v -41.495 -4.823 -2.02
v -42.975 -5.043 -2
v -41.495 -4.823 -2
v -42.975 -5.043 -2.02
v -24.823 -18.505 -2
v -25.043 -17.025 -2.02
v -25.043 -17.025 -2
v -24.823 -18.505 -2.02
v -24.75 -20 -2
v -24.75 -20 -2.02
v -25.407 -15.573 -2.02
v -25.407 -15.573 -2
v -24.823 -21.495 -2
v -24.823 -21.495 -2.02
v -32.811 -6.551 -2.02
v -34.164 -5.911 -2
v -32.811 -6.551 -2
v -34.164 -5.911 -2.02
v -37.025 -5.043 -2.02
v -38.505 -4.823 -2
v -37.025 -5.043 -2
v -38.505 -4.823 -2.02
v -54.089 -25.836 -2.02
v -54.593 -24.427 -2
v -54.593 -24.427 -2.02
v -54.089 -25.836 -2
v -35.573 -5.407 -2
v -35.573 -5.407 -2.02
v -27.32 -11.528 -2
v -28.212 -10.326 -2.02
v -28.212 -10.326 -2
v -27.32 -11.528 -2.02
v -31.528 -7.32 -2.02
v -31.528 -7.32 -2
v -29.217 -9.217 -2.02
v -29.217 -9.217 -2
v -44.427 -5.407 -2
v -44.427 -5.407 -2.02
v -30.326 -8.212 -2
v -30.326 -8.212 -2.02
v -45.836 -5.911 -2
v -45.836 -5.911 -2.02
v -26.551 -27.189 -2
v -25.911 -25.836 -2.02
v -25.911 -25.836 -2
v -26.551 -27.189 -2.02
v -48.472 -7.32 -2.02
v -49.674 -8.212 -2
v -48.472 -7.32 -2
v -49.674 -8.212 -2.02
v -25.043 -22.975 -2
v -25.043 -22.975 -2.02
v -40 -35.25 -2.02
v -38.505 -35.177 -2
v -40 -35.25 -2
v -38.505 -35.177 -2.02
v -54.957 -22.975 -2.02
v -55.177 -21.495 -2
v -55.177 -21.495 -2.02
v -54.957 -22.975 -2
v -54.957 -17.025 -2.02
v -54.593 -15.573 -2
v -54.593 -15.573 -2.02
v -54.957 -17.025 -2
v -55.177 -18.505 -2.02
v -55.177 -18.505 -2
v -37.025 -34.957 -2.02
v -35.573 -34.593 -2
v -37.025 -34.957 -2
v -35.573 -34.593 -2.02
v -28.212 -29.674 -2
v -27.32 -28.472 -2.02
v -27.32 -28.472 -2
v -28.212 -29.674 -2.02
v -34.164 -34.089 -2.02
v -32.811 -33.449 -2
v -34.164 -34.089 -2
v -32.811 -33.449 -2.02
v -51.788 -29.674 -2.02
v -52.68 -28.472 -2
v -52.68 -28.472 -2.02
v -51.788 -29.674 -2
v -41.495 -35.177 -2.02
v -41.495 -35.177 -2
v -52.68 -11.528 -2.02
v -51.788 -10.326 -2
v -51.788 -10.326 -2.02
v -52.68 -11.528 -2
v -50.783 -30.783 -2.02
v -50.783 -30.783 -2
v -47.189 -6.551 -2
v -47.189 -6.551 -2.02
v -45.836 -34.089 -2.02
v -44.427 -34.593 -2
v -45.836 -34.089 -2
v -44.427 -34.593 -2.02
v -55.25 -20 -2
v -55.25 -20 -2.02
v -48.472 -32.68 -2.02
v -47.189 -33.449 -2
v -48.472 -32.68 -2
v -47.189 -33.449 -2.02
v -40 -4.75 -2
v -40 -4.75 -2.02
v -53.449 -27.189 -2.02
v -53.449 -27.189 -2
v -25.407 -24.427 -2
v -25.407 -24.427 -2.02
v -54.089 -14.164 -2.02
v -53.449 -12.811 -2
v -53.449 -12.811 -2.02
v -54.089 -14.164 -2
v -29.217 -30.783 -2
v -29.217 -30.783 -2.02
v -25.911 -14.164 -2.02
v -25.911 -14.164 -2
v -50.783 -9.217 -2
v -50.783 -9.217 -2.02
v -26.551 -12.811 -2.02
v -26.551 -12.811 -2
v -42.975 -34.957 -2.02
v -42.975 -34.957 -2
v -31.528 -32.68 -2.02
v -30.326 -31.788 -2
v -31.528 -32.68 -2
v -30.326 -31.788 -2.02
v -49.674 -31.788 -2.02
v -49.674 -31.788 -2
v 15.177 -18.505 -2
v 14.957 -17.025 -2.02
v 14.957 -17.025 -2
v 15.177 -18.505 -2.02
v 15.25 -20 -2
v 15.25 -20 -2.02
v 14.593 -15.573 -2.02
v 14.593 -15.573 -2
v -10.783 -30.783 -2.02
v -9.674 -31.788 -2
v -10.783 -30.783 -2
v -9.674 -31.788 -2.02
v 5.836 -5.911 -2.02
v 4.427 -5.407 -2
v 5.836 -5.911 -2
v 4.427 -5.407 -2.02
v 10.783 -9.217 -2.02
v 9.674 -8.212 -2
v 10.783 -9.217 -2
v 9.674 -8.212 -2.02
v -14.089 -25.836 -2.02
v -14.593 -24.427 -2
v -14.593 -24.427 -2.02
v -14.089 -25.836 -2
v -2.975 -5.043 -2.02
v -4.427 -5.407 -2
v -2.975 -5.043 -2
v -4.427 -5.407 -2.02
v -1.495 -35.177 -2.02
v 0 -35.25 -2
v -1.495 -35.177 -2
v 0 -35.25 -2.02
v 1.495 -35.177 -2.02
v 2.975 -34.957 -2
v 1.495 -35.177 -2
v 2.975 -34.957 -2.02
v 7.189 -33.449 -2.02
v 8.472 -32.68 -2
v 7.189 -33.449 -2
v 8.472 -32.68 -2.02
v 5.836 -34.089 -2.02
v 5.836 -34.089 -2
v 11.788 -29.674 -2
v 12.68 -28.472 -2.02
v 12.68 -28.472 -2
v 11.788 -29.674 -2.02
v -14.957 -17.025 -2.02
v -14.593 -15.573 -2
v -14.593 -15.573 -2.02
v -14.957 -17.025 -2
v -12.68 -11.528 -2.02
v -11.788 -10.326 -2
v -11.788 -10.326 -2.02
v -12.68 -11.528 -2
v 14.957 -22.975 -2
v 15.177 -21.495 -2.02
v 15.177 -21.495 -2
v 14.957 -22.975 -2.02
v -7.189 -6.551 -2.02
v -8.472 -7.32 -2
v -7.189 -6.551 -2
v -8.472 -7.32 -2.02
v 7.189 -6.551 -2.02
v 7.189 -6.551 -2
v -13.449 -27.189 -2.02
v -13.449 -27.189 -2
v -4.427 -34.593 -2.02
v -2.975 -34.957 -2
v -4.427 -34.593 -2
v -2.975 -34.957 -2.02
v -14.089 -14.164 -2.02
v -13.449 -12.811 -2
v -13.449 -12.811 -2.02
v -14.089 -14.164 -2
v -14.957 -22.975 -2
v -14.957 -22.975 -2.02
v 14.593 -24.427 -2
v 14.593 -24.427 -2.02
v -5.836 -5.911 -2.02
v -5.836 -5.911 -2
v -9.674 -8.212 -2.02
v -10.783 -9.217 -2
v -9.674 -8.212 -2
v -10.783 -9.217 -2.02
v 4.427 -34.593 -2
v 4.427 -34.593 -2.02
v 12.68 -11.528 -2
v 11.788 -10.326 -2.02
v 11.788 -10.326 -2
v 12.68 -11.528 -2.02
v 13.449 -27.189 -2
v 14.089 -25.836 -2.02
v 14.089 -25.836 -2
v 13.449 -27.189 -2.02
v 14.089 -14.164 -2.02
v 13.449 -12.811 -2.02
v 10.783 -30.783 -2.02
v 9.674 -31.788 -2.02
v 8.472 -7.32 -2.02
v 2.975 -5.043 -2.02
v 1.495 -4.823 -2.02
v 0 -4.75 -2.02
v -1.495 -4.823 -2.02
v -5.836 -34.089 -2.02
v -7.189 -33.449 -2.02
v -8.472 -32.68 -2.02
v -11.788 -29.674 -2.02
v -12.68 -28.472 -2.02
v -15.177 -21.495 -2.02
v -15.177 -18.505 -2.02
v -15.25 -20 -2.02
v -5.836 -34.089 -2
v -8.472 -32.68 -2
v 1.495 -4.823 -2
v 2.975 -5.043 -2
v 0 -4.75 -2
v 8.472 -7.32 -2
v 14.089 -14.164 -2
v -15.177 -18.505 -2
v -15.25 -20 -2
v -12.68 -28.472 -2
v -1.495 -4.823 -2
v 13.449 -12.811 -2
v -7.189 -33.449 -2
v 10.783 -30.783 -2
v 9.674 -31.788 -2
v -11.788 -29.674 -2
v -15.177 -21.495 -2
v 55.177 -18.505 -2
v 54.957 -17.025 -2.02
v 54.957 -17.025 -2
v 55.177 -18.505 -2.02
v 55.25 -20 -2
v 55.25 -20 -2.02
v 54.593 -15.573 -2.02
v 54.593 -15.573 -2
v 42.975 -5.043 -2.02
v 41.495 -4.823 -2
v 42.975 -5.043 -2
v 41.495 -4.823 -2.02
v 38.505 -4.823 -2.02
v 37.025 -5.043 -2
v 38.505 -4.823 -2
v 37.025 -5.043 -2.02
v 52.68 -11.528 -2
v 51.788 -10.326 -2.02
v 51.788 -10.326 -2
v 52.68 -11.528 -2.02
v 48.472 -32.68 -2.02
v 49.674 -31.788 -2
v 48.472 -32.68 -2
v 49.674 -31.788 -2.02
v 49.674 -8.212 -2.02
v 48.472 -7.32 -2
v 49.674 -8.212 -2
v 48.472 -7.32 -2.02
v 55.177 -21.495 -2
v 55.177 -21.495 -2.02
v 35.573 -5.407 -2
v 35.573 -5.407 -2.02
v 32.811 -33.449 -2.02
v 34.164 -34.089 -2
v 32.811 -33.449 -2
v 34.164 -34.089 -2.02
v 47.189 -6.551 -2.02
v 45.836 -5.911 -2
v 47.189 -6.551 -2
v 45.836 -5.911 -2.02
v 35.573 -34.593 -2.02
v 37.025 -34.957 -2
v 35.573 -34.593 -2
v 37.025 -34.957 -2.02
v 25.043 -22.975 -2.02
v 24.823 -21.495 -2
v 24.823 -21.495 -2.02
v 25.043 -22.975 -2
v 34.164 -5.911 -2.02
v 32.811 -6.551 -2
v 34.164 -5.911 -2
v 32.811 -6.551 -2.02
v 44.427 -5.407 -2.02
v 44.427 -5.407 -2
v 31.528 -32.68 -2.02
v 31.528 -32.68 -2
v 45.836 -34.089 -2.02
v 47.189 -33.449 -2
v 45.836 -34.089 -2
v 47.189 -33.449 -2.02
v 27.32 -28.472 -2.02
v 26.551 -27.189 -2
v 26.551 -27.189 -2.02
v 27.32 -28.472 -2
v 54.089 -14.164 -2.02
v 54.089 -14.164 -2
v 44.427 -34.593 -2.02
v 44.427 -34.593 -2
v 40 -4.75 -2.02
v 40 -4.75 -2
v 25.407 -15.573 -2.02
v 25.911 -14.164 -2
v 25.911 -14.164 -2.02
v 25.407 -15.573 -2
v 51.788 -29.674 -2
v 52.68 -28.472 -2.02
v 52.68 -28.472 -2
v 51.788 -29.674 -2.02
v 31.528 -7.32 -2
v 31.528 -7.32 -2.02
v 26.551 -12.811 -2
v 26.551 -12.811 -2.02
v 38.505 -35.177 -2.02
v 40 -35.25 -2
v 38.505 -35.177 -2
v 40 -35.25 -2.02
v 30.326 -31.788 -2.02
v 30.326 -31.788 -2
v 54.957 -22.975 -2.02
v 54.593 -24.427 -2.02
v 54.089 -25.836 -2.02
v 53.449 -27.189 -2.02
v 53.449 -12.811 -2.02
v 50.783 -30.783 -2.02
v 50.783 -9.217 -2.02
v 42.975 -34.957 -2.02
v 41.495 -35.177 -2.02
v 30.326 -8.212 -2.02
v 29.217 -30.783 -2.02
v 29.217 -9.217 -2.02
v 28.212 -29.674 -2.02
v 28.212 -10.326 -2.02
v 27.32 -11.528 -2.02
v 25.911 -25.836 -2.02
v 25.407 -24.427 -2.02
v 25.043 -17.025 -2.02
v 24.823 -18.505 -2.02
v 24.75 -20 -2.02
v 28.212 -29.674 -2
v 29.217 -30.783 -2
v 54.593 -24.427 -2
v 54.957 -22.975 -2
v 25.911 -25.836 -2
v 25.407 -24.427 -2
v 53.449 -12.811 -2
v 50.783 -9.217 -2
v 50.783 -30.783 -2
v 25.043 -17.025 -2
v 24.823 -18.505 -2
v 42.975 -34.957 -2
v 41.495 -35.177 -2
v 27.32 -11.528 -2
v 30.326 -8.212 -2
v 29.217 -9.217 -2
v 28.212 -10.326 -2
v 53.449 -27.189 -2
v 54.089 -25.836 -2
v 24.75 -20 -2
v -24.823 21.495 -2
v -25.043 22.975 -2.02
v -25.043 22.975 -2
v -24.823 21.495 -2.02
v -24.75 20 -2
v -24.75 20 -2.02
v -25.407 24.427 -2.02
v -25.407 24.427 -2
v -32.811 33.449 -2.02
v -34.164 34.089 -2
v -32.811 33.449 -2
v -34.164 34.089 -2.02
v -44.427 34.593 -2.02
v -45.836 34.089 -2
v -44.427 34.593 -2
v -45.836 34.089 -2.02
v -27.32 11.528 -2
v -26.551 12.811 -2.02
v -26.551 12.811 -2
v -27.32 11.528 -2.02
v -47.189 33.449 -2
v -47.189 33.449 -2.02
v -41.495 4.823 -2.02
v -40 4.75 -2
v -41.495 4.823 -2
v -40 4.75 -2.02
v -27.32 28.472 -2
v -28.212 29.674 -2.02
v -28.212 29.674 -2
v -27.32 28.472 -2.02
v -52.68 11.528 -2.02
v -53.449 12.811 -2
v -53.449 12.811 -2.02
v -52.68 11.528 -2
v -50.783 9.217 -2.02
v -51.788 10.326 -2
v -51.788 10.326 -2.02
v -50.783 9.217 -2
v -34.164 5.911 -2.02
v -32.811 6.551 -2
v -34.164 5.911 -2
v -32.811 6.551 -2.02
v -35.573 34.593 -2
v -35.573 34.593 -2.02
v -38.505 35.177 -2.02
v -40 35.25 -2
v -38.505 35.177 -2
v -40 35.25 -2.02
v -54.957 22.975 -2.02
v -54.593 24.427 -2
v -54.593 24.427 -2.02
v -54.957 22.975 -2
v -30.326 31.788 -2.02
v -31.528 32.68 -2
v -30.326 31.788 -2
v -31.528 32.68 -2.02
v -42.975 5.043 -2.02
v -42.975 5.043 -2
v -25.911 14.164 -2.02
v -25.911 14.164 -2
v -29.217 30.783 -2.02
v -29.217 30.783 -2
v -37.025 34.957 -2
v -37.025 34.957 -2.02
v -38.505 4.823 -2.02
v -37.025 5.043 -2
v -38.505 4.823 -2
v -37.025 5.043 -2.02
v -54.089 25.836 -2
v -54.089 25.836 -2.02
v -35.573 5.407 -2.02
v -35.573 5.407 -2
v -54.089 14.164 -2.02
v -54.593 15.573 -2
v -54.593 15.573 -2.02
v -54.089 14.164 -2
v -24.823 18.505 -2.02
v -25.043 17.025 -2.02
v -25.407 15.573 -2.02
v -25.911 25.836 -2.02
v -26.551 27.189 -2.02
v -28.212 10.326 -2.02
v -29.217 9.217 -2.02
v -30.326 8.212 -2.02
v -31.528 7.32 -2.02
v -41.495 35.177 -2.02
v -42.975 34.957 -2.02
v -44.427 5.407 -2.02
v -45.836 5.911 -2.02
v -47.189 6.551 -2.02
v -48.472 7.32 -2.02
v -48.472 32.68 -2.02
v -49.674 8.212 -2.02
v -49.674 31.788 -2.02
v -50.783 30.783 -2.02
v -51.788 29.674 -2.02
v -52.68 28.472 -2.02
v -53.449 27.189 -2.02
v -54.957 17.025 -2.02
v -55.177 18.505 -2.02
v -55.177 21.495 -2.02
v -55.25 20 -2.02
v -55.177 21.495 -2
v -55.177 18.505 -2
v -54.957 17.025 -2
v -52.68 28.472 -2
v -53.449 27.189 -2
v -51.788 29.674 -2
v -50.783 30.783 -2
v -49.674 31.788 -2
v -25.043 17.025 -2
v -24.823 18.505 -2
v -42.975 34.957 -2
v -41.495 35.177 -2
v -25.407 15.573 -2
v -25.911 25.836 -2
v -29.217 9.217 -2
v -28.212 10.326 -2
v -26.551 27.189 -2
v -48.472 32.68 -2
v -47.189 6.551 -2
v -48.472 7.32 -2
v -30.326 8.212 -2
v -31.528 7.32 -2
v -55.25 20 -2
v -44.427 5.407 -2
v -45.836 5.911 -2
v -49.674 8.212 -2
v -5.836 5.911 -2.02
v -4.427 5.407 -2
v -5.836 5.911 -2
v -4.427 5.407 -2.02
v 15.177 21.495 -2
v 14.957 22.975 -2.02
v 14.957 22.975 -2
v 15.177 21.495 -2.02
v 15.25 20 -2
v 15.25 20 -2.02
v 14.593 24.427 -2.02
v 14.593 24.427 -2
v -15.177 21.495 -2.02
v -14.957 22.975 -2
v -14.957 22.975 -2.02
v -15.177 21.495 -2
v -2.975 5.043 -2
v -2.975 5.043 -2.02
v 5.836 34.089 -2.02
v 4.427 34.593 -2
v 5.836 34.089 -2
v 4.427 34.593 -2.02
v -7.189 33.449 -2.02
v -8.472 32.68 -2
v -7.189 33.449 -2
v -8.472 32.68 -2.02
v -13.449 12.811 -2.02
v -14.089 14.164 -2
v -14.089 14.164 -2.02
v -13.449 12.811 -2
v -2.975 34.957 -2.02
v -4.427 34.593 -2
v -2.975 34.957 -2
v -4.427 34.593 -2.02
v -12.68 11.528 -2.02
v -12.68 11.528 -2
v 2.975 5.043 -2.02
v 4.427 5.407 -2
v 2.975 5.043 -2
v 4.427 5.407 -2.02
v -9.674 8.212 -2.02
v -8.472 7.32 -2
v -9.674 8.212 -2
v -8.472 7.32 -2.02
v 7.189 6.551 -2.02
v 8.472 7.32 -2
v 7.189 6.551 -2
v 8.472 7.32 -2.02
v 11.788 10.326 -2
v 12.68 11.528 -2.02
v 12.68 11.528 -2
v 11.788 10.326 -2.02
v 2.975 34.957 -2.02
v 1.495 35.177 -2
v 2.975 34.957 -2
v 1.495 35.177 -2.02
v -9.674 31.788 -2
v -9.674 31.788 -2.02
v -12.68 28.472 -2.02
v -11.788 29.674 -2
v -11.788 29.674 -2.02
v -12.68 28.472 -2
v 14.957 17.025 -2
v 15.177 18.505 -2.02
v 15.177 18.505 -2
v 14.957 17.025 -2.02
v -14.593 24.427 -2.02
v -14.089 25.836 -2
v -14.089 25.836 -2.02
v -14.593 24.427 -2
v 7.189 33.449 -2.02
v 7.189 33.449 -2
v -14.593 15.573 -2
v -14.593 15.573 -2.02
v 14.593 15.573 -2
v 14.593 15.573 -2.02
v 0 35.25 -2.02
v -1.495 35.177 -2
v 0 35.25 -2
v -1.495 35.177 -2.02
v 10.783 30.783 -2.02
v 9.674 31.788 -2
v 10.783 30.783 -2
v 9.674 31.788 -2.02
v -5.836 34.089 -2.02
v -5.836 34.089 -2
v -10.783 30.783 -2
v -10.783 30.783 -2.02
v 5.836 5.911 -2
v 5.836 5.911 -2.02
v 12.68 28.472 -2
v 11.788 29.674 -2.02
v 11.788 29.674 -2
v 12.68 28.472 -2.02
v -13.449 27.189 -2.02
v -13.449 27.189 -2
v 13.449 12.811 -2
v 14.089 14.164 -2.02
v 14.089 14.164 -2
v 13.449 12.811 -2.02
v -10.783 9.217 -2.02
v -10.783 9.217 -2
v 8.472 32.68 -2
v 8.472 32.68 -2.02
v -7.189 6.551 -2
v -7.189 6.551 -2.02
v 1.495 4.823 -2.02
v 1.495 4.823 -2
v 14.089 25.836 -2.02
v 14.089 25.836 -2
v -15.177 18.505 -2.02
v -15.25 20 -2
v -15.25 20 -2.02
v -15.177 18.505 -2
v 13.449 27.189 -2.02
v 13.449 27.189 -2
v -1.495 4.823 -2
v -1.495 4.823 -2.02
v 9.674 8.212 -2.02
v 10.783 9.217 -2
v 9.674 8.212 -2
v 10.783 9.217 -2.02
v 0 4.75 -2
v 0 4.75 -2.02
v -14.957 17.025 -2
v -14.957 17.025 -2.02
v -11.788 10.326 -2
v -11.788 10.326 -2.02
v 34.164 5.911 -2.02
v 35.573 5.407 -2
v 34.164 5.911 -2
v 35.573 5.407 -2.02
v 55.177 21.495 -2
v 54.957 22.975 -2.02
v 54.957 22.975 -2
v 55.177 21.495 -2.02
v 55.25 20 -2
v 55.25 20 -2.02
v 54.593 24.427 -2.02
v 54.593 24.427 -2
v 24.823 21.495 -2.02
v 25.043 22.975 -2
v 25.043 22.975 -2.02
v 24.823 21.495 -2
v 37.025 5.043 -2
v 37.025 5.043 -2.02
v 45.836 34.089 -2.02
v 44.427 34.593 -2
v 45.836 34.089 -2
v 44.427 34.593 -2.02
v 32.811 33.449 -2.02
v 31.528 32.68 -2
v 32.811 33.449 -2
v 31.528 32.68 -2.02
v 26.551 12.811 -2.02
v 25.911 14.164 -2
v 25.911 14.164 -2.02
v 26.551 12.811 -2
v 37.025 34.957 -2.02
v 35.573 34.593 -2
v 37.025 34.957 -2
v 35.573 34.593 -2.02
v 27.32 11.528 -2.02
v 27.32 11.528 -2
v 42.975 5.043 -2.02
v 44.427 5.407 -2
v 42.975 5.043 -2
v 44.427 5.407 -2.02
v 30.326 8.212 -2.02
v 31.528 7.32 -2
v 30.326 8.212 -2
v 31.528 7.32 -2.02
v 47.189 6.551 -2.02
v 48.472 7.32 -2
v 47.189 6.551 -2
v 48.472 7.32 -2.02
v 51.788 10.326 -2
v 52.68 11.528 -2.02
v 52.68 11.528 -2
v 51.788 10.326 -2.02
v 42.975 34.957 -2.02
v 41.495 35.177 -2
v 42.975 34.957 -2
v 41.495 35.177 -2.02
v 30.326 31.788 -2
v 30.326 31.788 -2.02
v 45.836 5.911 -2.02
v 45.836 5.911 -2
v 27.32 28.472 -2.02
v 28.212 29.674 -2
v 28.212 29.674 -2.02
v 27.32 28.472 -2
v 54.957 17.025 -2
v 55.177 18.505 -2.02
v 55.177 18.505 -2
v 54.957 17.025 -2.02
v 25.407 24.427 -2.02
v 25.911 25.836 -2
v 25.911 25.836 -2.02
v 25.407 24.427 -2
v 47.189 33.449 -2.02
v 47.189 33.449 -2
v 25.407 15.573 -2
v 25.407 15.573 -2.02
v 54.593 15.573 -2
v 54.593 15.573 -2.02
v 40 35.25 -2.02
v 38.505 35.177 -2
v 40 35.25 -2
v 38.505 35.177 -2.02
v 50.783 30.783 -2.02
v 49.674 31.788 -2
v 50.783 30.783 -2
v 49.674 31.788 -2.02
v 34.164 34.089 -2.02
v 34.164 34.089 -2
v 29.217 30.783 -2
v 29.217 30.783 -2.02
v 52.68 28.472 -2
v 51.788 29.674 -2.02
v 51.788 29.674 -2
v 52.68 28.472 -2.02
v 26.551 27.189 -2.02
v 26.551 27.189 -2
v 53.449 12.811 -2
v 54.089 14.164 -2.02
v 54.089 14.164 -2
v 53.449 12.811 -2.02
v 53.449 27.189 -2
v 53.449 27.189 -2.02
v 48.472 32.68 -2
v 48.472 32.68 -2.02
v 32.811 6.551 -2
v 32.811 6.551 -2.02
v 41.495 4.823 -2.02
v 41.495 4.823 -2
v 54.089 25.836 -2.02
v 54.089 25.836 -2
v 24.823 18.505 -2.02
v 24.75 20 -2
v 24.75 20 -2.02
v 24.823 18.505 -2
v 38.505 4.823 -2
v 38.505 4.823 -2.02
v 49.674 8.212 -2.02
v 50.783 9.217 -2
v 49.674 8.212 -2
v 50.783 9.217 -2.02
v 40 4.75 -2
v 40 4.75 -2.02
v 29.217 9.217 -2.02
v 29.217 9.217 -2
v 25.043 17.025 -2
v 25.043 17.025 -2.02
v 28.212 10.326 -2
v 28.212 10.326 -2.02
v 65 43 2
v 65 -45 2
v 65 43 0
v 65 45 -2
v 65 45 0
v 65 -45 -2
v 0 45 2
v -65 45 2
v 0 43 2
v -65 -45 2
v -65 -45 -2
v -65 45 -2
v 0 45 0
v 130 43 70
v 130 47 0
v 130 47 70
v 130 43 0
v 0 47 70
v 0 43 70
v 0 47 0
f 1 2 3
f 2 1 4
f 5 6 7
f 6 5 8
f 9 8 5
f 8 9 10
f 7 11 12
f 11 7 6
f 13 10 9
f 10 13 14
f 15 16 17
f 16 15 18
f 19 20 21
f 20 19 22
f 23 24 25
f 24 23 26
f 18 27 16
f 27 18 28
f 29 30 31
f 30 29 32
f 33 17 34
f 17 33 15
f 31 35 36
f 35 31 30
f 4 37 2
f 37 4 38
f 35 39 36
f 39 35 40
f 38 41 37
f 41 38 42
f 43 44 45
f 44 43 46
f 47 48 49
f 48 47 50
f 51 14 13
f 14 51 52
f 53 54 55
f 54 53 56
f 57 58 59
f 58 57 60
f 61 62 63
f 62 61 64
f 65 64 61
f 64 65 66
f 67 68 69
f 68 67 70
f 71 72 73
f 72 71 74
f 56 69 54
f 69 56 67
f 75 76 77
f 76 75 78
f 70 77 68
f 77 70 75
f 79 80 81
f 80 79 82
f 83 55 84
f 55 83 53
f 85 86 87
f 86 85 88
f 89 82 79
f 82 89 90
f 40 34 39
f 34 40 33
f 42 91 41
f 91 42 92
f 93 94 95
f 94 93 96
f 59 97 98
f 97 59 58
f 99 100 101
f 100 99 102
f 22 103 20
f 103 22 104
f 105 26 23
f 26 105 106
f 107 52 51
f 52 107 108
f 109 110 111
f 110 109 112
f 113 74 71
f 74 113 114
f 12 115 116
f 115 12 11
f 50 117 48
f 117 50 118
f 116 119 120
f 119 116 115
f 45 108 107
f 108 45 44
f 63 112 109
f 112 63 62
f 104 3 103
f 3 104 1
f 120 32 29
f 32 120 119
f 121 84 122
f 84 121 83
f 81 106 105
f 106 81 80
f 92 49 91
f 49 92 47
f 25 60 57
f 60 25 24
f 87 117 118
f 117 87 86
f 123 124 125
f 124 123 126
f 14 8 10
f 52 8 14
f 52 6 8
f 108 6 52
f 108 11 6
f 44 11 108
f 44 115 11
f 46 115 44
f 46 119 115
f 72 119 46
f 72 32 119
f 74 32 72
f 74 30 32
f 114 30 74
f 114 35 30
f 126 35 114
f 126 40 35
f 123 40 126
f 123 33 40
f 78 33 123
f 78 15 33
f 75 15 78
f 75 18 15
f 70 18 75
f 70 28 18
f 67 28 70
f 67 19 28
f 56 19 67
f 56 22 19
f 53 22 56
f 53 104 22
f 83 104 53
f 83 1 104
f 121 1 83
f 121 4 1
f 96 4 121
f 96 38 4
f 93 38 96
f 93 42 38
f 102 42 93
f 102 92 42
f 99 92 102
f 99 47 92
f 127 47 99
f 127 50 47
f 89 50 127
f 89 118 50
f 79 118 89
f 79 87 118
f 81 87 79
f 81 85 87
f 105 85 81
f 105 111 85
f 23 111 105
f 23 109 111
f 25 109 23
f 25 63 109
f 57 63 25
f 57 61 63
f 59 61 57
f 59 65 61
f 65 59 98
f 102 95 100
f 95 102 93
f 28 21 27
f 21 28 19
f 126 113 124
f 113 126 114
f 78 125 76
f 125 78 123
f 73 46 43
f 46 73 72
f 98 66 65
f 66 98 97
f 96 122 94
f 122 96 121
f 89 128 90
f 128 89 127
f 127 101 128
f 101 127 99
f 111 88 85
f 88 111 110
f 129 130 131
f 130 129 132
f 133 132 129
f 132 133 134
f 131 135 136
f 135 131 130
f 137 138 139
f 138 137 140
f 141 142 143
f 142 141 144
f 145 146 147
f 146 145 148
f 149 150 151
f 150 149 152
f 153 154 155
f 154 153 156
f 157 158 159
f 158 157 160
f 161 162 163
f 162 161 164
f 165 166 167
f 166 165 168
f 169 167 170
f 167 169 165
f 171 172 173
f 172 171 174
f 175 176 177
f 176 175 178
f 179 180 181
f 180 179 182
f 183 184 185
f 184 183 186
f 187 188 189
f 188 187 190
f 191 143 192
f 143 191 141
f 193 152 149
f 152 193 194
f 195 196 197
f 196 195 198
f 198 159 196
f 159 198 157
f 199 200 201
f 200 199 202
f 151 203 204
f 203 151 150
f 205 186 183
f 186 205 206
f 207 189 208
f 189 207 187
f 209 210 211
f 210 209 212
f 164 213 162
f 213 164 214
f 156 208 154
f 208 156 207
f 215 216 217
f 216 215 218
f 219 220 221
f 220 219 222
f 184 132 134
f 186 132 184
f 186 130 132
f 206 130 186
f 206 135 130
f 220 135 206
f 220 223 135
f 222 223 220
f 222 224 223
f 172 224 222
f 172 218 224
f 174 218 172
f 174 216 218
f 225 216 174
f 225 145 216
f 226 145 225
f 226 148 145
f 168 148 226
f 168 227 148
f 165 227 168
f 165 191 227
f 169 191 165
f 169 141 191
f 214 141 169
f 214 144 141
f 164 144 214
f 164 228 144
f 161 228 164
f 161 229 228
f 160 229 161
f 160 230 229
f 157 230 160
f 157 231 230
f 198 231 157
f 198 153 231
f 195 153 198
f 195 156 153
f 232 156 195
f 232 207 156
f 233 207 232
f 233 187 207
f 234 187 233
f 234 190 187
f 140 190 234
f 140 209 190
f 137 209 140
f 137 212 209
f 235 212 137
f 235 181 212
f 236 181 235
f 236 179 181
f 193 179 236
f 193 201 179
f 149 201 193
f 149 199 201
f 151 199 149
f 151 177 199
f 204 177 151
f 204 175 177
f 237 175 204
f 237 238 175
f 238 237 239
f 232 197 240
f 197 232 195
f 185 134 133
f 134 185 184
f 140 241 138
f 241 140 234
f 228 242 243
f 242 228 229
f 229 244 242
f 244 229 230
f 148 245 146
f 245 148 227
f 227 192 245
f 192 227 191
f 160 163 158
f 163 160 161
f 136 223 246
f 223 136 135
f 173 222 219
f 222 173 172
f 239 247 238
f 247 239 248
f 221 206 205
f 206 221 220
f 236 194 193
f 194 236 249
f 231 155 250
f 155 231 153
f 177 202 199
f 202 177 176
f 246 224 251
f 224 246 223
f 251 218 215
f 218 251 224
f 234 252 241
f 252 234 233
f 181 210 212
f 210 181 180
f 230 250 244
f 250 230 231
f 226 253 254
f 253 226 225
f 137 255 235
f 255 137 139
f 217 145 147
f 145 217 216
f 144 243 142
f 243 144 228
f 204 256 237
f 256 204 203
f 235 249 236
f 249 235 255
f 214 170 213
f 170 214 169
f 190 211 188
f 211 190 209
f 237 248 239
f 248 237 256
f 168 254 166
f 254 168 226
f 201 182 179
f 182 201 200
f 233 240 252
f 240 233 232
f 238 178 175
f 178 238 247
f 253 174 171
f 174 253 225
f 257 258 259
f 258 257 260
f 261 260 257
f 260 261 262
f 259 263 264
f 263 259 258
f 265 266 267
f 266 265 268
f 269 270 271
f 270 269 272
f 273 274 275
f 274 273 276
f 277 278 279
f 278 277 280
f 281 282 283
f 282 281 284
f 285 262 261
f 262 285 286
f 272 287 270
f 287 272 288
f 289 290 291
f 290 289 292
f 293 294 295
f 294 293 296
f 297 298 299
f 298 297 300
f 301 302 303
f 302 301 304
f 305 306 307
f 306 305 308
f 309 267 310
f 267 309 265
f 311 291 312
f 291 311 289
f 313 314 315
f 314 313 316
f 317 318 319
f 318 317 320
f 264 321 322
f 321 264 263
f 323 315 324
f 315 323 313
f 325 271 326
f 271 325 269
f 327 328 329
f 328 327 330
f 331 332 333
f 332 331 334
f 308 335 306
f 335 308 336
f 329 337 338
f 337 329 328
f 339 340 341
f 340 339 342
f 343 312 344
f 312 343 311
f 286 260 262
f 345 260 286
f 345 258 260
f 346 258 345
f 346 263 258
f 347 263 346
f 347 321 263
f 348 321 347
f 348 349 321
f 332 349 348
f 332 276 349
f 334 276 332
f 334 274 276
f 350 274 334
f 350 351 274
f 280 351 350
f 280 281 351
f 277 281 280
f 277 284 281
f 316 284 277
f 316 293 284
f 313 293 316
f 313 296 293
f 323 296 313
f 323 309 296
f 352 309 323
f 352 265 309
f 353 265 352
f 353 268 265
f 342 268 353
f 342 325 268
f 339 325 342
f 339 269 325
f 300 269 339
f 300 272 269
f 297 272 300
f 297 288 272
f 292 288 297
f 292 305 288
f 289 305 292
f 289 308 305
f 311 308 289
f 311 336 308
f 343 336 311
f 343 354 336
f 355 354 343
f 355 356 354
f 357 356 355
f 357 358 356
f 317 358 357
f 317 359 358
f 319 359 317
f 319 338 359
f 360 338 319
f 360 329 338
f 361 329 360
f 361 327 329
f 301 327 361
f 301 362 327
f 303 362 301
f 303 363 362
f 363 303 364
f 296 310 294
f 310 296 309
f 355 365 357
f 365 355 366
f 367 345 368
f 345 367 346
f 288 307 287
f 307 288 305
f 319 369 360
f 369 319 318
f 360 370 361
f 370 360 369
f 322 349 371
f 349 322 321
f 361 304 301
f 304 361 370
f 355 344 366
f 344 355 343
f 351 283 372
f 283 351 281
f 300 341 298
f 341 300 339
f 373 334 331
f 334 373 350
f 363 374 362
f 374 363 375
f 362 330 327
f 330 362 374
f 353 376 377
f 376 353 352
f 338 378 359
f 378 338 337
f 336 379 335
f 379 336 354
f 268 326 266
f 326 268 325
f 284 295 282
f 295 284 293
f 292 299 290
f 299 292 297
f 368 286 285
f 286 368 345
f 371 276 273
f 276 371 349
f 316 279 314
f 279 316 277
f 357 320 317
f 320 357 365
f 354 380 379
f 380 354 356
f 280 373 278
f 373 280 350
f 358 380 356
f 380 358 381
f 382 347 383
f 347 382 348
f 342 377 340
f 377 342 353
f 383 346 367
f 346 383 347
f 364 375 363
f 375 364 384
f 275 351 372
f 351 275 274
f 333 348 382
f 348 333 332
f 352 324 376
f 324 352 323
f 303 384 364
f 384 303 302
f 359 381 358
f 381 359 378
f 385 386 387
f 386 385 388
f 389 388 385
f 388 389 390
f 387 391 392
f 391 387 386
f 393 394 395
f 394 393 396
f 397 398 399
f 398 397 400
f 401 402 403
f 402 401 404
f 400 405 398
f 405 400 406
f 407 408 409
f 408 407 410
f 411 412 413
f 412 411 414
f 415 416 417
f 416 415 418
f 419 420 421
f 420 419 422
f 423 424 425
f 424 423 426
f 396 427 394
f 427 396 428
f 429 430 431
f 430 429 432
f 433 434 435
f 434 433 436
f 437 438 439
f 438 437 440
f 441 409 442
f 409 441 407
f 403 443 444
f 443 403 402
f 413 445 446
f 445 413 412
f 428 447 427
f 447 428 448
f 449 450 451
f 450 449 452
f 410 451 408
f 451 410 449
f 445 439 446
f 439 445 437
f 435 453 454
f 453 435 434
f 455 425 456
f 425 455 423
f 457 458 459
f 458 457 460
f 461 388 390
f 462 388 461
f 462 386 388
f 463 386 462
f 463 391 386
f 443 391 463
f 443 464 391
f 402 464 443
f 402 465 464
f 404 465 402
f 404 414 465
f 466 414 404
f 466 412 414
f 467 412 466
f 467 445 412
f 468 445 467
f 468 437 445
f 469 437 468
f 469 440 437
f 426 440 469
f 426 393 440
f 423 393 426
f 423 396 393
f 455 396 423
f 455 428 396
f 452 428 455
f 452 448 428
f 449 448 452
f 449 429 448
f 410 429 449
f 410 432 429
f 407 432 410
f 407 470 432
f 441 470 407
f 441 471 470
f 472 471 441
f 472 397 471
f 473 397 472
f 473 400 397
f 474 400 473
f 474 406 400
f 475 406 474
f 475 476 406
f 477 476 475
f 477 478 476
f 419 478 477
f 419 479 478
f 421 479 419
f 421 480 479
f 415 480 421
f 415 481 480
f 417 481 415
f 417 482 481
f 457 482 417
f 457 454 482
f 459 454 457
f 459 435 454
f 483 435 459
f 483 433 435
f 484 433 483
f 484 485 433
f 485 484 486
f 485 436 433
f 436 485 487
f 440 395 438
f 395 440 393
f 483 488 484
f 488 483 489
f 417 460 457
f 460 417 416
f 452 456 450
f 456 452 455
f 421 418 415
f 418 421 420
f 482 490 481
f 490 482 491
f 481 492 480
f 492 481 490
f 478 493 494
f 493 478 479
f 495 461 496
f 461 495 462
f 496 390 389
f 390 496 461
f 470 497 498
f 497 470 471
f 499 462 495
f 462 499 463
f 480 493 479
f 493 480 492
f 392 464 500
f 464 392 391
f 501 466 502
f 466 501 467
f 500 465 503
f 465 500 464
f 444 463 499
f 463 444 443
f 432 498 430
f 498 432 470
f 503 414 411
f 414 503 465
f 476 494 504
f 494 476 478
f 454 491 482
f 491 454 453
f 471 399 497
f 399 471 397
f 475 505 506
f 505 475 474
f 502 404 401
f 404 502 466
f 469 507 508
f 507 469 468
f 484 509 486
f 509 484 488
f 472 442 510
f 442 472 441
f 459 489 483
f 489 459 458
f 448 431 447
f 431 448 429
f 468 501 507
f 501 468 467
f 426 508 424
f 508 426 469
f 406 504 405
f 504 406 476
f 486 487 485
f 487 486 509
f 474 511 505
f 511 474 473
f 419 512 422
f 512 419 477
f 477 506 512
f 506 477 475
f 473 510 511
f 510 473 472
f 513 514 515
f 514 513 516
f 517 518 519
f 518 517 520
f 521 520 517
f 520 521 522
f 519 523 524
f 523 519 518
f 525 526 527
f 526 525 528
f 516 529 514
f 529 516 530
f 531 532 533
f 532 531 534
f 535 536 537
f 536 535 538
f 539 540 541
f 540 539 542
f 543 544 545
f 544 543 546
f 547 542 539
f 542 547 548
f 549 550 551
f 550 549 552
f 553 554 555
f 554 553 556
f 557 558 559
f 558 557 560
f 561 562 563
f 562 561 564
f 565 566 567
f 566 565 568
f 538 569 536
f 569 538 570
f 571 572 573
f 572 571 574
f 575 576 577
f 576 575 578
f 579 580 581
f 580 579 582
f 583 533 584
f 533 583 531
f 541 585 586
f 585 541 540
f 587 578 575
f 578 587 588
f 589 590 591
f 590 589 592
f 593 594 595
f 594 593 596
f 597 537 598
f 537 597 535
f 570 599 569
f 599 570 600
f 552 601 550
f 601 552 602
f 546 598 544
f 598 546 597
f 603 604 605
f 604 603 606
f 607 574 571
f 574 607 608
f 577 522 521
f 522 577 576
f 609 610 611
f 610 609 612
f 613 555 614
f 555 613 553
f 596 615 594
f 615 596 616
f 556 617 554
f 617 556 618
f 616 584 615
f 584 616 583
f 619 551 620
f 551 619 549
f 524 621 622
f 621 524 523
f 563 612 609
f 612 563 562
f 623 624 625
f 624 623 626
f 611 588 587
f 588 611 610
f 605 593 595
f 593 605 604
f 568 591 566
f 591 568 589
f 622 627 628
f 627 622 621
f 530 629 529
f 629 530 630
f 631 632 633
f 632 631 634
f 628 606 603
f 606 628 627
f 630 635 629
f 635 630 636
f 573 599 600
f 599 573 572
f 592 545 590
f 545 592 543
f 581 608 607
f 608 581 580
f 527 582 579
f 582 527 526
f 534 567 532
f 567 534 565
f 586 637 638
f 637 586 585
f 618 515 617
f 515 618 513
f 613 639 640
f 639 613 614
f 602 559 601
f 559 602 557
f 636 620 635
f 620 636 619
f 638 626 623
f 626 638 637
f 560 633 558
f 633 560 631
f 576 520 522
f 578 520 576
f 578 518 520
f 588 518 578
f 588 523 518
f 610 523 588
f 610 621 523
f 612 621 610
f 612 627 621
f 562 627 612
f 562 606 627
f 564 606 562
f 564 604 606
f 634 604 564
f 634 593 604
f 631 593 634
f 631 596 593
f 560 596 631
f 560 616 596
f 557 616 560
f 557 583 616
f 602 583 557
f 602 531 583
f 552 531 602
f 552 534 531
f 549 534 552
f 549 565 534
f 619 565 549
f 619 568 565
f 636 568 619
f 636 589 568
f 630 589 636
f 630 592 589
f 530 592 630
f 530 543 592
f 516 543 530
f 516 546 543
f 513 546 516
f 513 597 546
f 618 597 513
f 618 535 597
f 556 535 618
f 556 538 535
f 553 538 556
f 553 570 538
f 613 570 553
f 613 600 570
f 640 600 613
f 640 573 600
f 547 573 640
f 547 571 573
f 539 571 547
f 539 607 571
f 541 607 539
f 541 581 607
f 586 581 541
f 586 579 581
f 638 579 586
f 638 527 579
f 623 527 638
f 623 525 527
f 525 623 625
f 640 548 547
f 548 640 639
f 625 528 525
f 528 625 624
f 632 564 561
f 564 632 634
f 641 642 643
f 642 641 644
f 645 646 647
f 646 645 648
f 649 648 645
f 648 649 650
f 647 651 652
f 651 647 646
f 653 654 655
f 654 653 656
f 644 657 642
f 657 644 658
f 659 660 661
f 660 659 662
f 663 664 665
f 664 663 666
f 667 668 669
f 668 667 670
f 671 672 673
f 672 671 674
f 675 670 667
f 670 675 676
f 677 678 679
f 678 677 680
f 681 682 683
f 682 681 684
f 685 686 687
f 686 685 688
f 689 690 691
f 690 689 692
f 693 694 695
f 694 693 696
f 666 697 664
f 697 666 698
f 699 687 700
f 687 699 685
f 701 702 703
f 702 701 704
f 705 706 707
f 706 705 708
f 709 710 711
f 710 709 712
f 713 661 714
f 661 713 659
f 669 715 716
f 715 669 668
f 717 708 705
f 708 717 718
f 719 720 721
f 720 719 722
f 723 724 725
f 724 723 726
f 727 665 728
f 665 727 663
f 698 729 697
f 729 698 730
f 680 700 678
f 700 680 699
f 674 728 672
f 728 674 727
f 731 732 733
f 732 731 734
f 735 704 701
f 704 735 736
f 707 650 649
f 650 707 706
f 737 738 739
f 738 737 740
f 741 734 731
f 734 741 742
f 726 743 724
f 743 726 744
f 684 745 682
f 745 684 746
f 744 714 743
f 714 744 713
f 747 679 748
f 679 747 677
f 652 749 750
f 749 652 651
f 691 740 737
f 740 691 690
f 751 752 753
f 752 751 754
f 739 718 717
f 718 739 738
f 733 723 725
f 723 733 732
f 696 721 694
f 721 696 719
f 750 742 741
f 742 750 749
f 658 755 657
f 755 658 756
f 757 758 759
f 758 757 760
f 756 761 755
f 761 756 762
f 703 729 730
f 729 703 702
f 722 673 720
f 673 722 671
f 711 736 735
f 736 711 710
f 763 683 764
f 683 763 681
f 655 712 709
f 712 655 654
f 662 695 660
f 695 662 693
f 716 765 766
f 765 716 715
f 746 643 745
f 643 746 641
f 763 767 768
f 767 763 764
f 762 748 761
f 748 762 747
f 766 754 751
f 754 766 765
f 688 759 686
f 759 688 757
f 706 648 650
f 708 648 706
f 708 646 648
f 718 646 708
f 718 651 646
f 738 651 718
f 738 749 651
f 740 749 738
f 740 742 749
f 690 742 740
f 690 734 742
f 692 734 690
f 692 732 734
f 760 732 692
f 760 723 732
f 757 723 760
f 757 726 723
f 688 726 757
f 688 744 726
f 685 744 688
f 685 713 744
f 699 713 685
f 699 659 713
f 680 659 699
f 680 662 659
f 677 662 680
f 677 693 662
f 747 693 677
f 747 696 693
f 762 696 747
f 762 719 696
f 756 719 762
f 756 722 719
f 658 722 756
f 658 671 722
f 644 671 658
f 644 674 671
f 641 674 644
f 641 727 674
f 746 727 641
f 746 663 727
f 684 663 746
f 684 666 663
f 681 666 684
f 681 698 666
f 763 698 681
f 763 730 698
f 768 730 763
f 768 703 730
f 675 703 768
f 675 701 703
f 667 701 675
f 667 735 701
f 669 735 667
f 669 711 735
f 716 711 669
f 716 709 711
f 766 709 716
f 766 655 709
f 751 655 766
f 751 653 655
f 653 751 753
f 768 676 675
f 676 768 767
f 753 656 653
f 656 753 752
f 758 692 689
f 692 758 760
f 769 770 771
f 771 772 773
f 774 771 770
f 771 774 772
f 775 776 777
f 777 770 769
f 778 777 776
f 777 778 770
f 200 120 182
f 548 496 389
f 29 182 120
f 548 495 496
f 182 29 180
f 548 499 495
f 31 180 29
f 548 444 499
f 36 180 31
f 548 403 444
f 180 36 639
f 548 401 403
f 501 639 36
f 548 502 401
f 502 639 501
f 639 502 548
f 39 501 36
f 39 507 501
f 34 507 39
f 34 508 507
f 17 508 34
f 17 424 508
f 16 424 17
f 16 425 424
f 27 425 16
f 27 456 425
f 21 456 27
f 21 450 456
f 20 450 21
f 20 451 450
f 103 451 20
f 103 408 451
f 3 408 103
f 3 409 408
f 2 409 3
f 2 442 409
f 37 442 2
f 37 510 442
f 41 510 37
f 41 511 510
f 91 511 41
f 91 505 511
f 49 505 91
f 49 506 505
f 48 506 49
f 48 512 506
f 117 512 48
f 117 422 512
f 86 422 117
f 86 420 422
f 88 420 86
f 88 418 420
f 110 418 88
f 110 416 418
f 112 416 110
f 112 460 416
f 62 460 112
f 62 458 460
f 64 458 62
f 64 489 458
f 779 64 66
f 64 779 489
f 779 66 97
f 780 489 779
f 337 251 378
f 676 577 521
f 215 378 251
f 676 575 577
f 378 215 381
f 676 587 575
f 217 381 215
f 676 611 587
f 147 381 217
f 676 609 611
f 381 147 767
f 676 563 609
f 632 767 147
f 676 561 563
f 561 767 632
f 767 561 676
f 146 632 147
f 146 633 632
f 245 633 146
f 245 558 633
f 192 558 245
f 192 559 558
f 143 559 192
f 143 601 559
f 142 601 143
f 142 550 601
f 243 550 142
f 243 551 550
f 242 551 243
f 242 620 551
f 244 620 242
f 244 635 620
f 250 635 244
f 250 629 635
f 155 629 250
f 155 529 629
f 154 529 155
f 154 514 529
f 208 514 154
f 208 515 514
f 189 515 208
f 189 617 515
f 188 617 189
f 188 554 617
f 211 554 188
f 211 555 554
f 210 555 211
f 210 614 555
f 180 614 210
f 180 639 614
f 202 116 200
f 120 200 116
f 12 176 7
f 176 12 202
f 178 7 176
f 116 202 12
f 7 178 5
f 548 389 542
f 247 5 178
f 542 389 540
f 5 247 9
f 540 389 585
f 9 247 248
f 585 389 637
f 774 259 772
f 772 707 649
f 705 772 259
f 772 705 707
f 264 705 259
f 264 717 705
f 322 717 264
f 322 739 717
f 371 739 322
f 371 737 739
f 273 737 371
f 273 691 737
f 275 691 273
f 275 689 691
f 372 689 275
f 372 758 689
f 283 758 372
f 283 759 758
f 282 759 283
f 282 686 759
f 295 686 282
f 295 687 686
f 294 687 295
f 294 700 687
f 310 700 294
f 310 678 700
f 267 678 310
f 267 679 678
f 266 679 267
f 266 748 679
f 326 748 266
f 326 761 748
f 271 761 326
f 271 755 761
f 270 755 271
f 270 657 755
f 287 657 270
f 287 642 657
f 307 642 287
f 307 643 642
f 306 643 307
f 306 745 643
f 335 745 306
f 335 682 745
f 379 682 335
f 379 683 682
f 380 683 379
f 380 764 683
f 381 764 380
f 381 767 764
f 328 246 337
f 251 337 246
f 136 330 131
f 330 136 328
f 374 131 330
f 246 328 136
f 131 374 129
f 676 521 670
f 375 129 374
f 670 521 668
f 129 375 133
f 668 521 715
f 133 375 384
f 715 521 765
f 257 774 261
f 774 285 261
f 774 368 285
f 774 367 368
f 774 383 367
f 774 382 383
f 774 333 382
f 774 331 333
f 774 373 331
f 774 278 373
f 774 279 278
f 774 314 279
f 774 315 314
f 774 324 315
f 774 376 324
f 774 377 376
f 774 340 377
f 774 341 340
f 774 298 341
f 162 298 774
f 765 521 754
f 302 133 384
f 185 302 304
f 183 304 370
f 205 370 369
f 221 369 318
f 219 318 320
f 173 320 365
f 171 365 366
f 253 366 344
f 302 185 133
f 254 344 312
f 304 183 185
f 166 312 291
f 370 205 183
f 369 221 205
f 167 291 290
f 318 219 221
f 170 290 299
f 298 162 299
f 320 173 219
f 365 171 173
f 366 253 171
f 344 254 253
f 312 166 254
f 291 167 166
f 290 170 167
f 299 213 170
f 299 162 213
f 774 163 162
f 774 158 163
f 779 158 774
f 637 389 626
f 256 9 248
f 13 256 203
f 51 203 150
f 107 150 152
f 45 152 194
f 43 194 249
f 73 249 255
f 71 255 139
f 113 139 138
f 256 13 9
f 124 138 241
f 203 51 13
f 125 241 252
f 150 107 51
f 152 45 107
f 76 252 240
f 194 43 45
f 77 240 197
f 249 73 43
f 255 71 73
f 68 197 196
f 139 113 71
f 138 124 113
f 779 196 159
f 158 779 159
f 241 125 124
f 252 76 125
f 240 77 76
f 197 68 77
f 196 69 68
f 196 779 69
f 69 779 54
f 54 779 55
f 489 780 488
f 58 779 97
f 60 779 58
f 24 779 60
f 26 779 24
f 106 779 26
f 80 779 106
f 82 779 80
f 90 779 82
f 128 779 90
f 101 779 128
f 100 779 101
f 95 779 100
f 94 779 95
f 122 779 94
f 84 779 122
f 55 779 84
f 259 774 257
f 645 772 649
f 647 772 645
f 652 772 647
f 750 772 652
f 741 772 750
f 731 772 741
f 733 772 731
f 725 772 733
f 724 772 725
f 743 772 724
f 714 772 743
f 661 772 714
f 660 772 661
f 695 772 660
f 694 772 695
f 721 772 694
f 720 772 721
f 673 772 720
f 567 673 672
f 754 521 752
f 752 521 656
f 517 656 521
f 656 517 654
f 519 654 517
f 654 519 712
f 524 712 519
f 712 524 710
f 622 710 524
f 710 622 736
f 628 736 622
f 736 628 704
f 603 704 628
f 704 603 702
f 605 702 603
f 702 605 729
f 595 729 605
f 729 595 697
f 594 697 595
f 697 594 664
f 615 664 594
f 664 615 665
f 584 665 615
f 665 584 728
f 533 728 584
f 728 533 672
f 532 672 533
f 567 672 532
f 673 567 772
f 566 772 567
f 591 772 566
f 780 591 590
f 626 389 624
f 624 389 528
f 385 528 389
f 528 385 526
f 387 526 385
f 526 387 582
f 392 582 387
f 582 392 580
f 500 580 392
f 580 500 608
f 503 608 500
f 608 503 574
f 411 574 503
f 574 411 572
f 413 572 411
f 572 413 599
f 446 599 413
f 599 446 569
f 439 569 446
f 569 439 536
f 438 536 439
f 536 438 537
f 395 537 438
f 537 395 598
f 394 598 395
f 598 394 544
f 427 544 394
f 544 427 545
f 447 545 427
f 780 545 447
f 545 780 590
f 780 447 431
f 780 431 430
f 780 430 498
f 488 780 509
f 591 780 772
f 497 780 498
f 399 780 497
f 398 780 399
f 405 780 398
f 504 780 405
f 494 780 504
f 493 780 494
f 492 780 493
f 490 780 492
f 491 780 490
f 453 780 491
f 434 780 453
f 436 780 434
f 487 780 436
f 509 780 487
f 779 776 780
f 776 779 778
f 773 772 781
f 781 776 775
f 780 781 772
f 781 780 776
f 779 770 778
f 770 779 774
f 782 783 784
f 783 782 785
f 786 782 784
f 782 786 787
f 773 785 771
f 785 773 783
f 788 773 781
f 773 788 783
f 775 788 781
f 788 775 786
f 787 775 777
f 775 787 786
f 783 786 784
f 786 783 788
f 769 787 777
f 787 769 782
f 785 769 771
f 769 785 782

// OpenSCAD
// Dimensions for the rack for six 50 mL conical (Falcon-type) tubes
// Print orientation: flat plate on bed (z = 0 to 4), walls rise from edges
// After flipping, rack stands on walls, tubes through holes

// Plate dimensions
plate_length_X = 130;   // mm
plate_width_Y = 90;     // mm
plate_thickness_Z = 4;   // mm

// Hole parameters
hole_diameter = 30.5;   // mm
hole_spacing_X = 40;        // mm (center-to-center along X)
hole_spacing_Y = 40;     // mm (center-to-center along Y)
num_holes_X = 3;       // 3 holes along X (2 rows of 3)
num_holes_Y = 2;       // 2 rows along Y

// Wall parameters
wall_length_X = plate_length_X;     // 130 mm
wall_thickness_Y = 4;                   // mm (along Y)
wall_height_Z = 70;                 // mm (from plate to top)

// Center of plate at origin (X, Y) = (0, 0)
// Holes arranged in a 2x3 grid, centered on plate

// Set resolution for smooth curves
$fn = 64;

// Main module
module rack() {
    // 1. Plate: flat rectangular base
    translate([0, 0, 0])
        cube([plate_length_X, plate_width_Y, plate_thickness_Z], center = true);

    // 2. Holes: 2 rows of 3 holes, centered on plate
    // Center of grid: (0, 0) for the whole array
    // Hole positions: offset from center by half-grid span
    for (i = [0 : num_holes_Y - 1]) {
        for (j = [0 : num_holes_X - 1]) {
            // Calculate hole center in X and Y
            // X: from -((num_holes_X - 1)/2)*hole_spacing_X to +((num_holes_X - 1)/2)*hole_spacing_X
            // Y: from -((num_holes_Y - 1)/2)*hole_spacing_Y to +((num_holes_Y - 1)/2)*hole_spacing_Y
            hole_x = (j - (num_holes_X - 1)/2) * hole_spacing_X;
            hole_y = (i - (num_holes_Y - 1)/2) * hole_spacing_Y;

            // Cut hole through the plate (extend slightly beyond to ensure clean cut)
            translate([hole_x, hole_y, -0.01])
                cylinder(h = plate_thickness_Z + 0.02, d = hole_diameter, center = true);
        }
    }

    // 3. Wall along Y = -plate_width_Y/2 (bottom long edge)
    // Wall is 4 mm thick in Y, 130 mm long in X, from z = 0 to 70
    // Positioned at Y = -plate_width_Y/2 - wall_thickness_Y/2 (so wall is flush with edge)
    wall_offset_Y = -plate_width_Y/2 - wall_thickness_Y/2;
    translate([0, wall_offset_Y, 0])
        cube([wall_length_X, wall_thickness_Y, wall_height_Z], center = false);

    // 4. Wall along Y = +plate_width_Y/2 (top long edge)
    wall_offset_Y = +plate_width_Y/2 - wall_thickness_Y/2;
    translate([0, wall_offset_Y, 0])
        cube([wall_length_X, wall_thickness_Y, wall_height_Z], center = false);
}

// Render the entire rack
rack();
